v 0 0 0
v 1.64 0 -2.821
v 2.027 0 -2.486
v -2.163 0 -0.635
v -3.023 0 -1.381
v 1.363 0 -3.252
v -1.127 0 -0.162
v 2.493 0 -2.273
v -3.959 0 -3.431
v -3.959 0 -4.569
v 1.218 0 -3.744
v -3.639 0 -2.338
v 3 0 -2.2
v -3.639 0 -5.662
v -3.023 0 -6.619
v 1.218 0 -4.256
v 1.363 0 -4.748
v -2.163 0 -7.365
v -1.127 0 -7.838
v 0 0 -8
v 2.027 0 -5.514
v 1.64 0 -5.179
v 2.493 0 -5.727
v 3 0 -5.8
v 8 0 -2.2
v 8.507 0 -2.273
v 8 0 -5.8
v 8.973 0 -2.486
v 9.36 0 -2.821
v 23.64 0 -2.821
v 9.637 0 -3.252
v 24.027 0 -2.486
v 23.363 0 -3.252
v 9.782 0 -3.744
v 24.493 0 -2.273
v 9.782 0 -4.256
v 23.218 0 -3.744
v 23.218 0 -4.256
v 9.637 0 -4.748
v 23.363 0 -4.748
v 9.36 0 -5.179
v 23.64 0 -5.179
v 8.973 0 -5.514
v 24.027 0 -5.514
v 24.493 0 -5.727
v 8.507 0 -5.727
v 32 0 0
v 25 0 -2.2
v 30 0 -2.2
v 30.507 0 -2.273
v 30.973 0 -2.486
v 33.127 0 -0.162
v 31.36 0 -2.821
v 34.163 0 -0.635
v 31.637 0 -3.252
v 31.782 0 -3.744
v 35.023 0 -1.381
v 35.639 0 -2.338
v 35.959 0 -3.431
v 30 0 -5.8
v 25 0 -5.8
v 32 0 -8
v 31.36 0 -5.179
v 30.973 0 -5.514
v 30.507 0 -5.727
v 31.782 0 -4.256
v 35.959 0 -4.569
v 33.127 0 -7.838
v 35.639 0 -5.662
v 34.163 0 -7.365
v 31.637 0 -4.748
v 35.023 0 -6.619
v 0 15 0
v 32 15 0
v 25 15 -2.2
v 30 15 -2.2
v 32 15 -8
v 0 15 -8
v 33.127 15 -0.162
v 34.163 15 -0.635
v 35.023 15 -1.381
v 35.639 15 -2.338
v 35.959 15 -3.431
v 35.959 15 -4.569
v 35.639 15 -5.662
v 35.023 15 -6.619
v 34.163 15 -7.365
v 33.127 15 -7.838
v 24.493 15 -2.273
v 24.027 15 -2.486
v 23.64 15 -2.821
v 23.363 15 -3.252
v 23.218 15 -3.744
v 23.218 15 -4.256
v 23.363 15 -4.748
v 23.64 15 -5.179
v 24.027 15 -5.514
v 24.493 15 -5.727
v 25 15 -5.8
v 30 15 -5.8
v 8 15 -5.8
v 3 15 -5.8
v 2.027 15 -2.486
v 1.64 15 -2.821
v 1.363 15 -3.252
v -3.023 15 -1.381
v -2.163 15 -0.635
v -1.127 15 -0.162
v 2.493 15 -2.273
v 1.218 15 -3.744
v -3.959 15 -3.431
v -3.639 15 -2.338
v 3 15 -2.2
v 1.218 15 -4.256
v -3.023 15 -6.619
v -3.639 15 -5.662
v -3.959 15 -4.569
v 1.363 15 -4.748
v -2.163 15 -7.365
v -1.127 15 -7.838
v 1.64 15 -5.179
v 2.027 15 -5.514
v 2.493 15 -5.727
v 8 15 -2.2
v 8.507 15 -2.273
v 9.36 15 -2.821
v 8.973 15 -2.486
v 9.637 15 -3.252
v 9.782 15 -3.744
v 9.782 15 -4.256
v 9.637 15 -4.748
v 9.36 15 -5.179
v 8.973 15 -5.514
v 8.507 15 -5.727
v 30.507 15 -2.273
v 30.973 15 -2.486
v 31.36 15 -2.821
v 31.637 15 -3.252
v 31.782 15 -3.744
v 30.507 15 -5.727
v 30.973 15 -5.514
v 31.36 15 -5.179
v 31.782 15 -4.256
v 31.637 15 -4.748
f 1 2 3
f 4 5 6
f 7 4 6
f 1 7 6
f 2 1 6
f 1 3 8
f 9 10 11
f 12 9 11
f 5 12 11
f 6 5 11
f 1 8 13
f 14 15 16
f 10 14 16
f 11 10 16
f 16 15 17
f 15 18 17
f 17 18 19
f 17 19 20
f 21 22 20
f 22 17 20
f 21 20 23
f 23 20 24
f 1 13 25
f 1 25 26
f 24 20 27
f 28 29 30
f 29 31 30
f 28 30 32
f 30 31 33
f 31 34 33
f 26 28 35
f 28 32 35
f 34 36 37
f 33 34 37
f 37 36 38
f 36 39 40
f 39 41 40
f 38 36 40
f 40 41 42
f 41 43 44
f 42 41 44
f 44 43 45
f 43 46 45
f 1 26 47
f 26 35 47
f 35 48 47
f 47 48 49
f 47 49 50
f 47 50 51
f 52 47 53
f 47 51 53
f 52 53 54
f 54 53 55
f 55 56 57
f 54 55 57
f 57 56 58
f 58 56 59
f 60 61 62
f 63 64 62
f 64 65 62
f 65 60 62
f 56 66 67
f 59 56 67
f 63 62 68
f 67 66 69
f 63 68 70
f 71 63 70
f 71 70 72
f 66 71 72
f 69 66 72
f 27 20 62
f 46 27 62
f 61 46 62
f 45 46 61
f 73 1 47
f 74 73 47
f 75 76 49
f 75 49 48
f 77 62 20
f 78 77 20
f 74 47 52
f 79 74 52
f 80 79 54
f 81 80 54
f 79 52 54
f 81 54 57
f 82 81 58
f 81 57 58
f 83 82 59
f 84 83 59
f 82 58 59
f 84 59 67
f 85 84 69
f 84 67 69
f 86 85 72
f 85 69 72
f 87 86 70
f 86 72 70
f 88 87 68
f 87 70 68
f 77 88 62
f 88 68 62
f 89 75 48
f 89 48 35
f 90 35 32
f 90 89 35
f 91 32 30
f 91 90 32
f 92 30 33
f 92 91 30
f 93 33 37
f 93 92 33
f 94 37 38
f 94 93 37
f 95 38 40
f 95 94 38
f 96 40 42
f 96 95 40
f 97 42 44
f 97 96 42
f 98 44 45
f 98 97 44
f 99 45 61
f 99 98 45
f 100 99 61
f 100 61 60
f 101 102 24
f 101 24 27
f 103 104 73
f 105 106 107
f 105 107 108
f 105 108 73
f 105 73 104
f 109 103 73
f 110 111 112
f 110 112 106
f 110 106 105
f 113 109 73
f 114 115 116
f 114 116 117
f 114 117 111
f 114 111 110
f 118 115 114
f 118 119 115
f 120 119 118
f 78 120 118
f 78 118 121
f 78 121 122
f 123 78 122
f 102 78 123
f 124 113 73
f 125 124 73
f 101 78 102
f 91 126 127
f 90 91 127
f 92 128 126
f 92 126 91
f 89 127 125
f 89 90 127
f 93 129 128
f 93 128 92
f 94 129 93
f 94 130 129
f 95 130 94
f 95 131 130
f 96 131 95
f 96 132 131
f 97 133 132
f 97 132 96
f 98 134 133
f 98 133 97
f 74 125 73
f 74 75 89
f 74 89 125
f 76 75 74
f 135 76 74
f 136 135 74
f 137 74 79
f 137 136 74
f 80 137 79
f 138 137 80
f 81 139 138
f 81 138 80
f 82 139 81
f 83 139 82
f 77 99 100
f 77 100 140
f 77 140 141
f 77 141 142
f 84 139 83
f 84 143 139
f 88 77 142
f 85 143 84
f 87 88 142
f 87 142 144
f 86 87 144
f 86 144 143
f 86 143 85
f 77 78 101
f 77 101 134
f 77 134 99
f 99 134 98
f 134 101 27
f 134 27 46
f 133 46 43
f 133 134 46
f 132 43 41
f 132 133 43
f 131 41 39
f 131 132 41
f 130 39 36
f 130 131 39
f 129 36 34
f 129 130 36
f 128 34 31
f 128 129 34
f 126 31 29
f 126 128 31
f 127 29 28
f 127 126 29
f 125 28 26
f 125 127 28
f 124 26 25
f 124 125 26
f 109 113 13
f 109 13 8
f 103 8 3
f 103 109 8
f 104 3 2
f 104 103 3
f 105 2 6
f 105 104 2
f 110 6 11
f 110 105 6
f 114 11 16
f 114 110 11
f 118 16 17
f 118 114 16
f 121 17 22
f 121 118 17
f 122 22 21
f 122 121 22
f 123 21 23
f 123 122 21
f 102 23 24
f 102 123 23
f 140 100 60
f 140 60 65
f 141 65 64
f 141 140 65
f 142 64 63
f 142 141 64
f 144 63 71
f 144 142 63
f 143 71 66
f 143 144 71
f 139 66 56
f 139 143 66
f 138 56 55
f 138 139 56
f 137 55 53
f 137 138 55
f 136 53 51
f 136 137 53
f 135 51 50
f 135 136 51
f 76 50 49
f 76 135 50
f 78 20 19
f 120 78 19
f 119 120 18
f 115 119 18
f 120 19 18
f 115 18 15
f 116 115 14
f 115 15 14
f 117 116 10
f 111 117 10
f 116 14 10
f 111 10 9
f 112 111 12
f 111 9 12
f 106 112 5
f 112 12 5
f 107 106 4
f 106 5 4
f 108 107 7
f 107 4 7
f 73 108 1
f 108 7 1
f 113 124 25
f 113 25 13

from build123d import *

# Parameters (mm, degrees)
BOSS_EXTRUDE2_DEPTH = 15
CUT_EXTRUDE1_DEPTH  = 40.812058475


with BuildPart() as part:
    # Sketch5 → Boss-Extrude2 (new body)
    with BuildSketch(Plane(origin=(0, 0, 0), x_dir=(1, 0, 0), z_dir=(0, 1, 0))):
        with BuildLine():
            Line((0, 0), (32, 0))
            ThreePointArc((32, 0), (36, 4), (32, 8))
            Line((32, 8), (0, 8))
            ThreePointArc((0, 8), (-4, 4), (0, 0))
        make_face()
    extrude(amount=BOSS_EXTRUDE2_DEPTH)

    # Sketch8 → Cut-Extrude1 (cut, through all)
    with BuildSketch(Plane(origin=(0, 15, 0), x_dir=(1, 0, 0), z_dir=(0, 1, 0))):
        with BuildLine():
            Line((3, 5.8), (8, 5.8))
            ThreePointArc((8, 5.8), (9.8, 4), (8, 2.2))
            Line((8, 2.2), (3, 2.2))
            ThreePointArc((3, 2.2), (1.2, 4), (3, 5.8))
        make_face()
        with BuildLine():
            Line((25, 5.8), (30, 5.8))
            ThreePointArc((30, 5.8), (31.8, 4), (30, 2.2))
            Line((30, 2.2), (25, 2.2))
            ThreePointArc((25, 2.2), (23.2, 4), (25, 5.8))
        make_face()
    extrude(amount=-CUT_EXTRUDE1_DEPTH, mode=Mode.SUBTRACT)


solid = part.part
